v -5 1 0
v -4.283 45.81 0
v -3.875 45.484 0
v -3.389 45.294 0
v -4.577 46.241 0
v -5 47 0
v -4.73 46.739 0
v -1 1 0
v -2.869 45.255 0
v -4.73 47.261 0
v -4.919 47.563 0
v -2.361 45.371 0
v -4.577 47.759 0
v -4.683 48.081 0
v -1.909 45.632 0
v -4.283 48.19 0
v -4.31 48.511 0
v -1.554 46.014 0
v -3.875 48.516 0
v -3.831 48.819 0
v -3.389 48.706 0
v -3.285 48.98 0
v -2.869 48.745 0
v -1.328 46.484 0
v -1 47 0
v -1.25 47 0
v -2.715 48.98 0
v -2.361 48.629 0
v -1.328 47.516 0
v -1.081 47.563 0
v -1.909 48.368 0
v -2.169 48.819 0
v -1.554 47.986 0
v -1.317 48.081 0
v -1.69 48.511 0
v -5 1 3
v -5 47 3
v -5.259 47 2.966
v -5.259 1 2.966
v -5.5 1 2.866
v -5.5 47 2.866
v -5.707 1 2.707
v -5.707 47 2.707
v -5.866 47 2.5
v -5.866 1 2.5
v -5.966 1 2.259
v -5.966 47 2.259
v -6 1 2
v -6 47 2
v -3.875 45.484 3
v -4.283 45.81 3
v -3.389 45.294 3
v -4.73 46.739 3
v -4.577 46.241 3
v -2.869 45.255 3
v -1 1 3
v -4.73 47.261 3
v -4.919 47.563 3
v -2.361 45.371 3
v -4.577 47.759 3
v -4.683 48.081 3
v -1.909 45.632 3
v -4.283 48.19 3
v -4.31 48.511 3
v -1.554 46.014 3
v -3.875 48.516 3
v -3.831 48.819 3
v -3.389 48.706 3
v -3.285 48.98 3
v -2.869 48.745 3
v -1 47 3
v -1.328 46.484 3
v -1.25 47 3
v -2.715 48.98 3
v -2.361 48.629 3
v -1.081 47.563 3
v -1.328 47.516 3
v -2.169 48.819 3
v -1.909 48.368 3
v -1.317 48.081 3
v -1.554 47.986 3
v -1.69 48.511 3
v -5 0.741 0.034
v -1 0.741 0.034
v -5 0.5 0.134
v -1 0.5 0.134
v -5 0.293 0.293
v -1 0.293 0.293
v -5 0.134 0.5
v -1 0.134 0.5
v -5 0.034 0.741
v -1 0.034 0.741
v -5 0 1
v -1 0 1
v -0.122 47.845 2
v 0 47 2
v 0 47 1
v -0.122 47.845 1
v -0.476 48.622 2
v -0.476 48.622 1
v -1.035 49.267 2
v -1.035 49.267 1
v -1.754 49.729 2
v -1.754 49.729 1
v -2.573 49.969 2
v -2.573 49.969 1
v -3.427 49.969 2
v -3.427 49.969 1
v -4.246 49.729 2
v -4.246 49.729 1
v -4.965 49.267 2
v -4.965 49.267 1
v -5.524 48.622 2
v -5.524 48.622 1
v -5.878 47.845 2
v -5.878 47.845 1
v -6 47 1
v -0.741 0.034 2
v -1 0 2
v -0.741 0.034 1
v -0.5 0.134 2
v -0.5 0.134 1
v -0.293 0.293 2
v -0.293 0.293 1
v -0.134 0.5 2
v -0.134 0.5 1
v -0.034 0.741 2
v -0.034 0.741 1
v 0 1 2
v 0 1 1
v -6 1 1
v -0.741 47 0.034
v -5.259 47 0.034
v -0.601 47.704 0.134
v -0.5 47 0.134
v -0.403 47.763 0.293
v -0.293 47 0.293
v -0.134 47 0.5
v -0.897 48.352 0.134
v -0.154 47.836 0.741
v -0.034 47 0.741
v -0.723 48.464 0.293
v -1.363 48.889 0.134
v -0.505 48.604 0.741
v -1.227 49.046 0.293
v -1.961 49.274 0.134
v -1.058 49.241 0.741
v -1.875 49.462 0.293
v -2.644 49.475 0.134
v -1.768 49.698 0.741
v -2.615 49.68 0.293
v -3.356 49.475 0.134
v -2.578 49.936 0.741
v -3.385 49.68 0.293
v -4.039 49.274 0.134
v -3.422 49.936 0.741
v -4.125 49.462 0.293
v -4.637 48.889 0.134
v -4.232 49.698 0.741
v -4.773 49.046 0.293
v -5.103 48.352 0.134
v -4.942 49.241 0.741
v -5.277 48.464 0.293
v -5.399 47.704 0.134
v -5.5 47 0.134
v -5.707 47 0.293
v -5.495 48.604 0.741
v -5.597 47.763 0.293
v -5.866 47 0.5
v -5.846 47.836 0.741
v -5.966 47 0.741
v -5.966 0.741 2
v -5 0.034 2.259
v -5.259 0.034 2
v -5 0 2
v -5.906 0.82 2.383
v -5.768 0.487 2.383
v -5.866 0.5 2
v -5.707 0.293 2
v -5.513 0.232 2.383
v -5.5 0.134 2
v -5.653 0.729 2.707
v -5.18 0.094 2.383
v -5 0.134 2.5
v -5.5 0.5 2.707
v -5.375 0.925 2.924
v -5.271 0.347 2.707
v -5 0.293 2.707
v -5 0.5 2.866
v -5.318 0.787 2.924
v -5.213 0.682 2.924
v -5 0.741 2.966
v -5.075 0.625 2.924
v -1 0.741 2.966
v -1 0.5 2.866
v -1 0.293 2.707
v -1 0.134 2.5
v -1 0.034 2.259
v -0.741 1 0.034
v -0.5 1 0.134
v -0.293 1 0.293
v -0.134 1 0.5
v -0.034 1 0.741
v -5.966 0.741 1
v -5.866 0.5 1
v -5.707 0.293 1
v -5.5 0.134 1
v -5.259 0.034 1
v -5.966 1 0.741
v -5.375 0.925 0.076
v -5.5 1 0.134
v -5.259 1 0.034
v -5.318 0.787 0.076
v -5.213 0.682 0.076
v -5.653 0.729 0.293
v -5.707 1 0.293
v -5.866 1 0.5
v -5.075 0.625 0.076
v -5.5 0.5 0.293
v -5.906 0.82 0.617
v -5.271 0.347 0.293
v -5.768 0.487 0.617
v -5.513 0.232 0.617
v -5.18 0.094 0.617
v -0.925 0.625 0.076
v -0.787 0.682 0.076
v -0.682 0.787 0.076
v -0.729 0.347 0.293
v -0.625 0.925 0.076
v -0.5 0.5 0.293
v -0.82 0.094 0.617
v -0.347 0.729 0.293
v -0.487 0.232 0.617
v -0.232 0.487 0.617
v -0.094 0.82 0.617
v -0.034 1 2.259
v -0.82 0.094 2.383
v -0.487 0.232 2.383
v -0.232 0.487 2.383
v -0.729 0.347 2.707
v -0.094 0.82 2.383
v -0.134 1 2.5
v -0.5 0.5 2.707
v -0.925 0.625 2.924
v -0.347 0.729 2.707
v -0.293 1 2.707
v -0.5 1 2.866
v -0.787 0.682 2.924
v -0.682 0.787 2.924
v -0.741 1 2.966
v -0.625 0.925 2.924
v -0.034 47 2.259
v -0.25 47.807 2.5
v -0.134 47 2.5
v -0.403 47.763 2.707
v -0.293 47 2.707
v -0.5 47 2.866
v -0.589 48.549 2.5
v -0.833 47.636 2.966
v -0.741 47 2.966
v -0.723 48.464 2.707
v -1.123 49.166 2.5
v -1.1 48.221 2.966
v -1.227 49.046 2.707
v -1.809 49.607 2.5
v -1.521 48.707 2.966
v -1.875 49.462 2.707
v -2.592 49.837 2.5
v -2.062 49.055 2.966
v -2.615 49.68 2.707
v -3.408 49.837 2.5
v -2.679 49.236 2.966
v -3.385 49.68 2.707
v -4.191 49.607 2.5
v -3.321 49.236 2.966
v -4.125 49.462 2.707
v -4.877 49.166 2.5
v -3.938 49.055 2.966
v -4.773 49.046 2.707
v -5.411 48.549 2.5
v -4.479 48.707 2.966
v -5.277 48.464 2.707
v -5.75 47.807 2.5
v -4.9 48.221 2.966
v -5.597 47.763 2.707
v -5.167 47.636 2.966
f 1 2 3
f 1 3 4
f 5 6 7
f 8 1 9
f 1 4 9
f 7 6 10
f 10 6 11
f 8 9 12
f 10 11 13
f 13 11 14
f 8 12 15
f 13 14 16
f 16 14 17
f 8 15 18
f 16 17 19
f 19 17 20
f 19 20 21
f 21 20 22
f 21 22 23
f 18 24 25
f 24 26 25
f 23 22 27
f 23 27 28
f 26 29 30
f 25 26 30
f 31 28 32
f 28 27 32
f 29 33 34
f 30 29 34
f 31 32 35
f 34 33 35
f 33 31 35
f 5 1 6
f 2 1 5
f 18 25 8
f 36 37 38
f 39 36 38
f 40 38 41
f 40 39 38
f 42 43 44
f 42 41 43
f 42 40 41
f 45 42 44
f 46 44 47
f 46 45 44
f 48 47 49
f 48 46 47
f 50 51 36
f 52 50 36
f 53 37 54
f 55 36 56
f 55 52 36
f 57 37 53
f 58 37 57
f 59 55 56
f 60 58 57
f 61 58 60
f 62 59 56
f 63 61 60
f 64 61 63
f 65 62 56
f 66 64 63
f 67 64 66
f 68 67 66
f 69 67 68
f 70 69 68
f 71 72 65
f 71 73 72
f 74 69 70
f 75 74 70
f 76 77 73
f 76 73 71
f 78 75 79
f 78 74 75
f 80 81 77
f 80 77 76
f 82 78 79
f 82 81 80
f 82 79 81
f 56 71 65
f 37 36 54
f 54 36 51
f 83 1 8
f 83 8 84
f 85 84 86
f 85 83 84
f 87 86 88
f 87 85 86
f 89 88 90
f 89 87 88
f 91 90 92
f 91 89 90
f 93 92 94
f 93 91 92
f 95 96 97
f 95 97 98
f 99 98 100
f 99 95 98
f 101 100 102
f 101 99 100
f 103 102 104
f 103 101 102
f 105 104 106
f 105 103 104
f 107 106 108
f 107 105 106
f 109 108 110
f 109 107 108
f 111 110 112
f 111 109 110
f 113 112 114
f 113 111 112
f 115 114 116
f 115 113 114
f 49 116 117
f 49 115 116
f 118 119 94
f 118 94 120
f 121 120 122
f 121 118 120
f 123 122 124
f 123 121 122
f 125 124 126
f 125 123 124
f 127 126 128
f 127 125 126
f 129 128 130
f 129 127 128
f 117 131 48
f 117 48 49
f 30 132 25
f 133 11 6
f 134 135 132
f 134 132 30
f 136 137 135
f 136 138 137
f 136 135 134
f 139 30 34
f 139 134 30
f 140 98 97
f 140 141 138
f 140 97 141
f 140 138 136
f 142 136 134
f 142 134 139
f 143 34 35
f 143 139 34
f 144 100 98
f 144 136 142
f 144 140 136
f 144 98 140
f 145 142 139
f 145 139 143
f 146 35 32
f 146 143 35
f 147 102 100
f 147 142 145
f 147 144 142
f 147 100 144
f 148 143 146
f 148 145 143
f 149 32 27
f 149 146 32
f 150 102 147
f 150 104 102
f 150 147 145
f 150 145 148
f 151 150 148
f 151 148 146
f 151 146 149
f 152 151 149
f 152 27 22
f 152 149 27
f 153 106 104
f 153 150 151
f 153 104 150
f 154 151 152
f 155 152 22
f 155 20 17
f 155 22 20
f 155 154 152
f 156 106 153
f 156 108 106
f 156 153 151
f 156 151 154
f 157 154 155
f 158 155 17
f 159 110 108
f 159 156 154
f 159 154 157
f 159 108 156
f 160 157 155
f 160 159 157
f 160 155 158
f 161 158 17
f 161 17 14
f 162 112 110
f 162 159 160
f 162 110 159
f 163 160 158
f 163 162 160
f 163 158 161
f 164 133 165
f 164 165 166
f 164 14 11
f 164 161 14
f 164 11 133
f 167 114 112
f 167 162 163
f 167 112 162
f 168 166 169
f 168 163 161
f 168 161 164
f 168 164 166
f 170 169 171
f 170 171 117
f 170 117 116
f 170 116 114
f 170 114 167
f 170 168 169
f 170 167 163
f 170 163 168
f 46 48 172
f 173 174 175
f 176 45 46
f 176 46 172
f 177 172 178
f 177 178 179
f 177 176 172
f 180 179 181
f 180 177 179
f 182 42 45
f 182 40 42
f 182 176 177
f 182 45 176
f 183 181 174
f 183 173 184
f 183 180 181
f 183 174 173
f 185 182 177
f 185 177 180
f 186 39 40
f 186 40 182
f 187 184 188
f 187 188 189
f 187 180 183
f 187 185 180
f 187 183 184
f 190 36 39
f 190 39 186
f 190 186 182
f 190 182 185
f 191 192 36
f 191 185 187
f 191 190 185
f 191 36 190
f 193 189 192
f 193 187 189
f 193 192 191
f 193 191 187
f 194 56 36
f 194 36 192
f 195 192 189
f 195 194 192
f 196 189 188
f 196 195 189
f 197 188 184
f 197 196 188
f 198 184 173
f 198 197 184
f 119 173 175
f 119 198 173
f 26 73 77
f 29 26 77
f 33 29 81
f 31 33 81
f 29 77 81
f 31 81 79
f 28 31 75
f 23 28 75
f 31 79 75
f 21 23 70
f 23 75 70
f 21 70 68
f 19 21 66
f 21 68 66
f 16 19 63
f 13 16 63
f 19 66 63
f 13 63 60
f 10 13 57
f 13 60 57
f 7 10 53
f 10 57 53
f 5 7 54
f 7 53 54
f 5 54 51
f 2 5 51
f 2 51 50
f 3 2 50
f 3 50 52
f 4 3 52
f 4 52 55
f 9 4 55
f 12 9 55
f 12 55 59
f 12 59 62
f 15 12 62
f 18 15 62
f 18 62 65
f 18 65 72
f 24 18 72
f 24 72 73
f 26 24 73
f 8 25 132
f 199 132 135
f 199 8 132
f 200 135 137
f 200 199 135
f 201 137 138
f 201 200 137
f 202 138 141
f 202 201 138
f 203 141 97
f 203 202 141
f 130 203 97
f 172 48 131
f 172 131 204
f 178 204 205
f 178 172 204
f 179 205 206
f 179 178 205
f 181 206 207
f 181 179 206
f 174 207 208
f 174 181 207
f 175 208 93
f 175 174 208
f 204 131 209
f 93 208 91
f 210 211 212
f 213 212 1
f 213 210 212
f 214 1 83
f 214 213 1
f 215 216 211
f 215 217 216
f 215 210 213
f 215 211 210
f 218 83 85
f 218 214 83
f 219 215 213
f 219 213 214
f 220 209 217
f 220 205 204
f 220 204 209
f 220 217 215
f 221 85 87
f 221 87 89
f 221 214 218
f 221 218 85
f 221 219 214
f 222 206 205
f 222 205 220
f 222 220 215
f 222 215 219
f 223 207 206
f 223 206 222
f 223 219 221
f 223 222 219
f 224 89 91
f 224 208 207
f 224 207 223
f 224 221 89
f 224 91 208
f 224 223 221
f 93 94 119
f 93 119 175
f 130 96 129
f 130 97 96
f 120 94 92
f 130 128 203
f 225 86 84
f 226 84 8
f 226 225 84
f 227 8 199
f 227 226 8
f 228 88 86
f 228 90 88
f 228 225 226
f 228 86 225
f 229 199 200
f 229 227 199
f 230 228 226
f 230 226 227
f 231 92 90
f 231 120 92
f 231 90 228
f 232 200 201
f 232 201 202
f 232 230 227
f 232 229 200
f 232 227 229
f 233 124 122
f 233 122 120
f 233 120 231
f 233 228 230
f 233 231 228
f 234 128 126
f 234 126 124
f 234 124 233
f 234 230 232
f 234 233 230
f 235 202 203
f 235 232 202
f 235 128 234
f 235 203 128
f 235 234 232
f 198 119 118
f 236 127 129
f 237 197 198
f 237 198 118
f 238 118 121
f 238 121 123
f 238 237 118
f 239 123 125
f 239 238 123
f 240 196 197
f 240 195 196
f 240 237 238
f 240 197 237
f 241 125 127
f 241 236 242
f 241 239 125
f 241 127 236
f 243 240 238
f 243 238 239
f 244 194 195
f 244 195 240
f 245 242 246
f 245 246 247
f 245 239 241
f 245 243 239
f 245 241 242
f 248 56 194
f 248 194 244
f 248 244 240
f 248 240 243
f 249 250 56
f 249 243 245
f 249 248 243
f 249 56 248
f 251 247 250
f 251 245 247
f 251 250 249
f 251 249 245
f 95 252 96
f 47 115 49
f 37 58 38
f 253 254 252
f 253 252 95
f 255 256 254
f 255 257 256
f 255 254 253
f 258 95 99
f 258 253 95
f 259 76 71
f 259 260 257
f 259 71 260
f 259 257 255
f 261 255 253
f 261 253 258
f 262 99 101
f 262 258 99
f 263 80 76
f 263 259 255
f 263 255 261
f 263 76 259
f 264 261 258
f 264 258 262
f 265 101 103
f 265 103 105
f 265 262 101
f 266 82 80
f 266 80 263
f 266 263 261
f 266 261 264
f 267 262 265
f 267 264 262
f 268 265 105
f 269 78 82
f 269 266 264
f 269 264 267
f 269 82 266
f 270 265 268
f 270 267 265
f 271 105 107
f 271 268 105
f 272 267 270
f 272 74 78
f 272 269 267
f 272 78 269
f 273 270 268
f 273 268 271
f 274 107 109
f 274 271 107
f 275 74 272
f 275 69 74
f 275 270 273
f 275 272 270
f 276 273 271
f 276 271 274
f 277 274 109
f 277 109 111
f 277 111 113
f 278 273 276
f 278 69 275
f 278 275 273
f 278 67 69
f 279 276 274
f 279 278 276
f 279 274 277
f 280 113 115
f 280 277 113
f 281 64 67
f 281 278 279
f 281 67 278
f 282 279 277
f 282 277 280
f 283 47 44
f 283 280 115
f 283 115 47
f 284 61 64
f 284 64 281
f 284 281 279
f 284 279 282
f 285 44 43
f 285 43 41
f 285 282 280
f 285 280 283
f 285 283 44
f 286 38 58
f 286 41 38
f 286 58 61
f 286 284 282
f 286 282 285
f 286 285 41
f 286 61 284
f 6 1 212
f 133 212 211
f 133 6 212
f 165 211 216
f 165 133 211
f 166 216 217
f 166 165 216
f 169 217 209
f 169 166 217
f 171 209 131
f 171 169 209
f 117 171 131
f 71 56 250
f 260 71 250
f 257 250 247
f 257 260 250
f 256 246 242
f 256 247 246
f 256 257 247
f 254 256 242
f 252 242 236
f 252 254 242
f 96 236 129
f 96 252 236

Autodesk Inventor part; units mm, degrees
ref_plane "YZ Plane" through (0, 0, 0) normal (1, 0, 0) x (0, 1, 0)
sketch "Эскиз1" plane through (0, 0, 0) normal (0, 0, 1) x (1, 0, 0)
  line L0 (0, 0) -> (-6, 0)
  line L1 (-6, 0) -> (-6, 47)
  line L2 (-6, 47) -> (0, 47)
  line L3 (0, 47) -> (0, 0)
  dimension "d0" = 6
  dimension "d1" = 47
extrude "Выдавливание1" add sketch "Эскиз1" along normal blind 3
fillet "Сопряжение1" radius 1 2 edges at (0, 0, 1.5) (-6, 0, 1.5)
ref_plane "РабПлоскость1" through (0, 0, 3) normal (0, 0, 1) x (1, 0, 0)
sketch "Эскиз3" plane through (0, 0, 3) normal (0, 0, 1) x (1, 0, 0)
  line L0 (0, 47) -> (-6, 47) projected
  circle A0 centre (-3, 47) radius 3
  point P0 (0, 0)
  dimension "d6" = 6
extrude "Выдавливание2" add sketch "Эскиз3" against normal blind 3
ref_plane "РабПлоскость2" through (0, 0, 3) normal (0, 0, 1) x (1, 0, 0)
sketch "Эскиз4" plane through (0, 0, 3) normal (0, 0, 1) x (1, 0, 0)
  circle A0 centre (-3, 47) radius 1.75
  point P0 (0, 0)
  dimension "d10" = 3.5
extrude "Выдавливание3" cut sketch "Эскиз4" against normal through all
fillet "Сопряжение2" radius 1 12 edges at (-0.2929, 0.2929, 3) (0, 24, 3) (-3, 50, 3) (-6, 24, 3) (-5.7071, 0.2929, 3) (-3, 0, 3) (-5.7071, 0.2929, 0) (-6, 24, 0) (-3, 50, 0) (0, 24, 0) (-0.2929, 0.2929, 0) (-3, 0, 0)
properties part number "ручка"
